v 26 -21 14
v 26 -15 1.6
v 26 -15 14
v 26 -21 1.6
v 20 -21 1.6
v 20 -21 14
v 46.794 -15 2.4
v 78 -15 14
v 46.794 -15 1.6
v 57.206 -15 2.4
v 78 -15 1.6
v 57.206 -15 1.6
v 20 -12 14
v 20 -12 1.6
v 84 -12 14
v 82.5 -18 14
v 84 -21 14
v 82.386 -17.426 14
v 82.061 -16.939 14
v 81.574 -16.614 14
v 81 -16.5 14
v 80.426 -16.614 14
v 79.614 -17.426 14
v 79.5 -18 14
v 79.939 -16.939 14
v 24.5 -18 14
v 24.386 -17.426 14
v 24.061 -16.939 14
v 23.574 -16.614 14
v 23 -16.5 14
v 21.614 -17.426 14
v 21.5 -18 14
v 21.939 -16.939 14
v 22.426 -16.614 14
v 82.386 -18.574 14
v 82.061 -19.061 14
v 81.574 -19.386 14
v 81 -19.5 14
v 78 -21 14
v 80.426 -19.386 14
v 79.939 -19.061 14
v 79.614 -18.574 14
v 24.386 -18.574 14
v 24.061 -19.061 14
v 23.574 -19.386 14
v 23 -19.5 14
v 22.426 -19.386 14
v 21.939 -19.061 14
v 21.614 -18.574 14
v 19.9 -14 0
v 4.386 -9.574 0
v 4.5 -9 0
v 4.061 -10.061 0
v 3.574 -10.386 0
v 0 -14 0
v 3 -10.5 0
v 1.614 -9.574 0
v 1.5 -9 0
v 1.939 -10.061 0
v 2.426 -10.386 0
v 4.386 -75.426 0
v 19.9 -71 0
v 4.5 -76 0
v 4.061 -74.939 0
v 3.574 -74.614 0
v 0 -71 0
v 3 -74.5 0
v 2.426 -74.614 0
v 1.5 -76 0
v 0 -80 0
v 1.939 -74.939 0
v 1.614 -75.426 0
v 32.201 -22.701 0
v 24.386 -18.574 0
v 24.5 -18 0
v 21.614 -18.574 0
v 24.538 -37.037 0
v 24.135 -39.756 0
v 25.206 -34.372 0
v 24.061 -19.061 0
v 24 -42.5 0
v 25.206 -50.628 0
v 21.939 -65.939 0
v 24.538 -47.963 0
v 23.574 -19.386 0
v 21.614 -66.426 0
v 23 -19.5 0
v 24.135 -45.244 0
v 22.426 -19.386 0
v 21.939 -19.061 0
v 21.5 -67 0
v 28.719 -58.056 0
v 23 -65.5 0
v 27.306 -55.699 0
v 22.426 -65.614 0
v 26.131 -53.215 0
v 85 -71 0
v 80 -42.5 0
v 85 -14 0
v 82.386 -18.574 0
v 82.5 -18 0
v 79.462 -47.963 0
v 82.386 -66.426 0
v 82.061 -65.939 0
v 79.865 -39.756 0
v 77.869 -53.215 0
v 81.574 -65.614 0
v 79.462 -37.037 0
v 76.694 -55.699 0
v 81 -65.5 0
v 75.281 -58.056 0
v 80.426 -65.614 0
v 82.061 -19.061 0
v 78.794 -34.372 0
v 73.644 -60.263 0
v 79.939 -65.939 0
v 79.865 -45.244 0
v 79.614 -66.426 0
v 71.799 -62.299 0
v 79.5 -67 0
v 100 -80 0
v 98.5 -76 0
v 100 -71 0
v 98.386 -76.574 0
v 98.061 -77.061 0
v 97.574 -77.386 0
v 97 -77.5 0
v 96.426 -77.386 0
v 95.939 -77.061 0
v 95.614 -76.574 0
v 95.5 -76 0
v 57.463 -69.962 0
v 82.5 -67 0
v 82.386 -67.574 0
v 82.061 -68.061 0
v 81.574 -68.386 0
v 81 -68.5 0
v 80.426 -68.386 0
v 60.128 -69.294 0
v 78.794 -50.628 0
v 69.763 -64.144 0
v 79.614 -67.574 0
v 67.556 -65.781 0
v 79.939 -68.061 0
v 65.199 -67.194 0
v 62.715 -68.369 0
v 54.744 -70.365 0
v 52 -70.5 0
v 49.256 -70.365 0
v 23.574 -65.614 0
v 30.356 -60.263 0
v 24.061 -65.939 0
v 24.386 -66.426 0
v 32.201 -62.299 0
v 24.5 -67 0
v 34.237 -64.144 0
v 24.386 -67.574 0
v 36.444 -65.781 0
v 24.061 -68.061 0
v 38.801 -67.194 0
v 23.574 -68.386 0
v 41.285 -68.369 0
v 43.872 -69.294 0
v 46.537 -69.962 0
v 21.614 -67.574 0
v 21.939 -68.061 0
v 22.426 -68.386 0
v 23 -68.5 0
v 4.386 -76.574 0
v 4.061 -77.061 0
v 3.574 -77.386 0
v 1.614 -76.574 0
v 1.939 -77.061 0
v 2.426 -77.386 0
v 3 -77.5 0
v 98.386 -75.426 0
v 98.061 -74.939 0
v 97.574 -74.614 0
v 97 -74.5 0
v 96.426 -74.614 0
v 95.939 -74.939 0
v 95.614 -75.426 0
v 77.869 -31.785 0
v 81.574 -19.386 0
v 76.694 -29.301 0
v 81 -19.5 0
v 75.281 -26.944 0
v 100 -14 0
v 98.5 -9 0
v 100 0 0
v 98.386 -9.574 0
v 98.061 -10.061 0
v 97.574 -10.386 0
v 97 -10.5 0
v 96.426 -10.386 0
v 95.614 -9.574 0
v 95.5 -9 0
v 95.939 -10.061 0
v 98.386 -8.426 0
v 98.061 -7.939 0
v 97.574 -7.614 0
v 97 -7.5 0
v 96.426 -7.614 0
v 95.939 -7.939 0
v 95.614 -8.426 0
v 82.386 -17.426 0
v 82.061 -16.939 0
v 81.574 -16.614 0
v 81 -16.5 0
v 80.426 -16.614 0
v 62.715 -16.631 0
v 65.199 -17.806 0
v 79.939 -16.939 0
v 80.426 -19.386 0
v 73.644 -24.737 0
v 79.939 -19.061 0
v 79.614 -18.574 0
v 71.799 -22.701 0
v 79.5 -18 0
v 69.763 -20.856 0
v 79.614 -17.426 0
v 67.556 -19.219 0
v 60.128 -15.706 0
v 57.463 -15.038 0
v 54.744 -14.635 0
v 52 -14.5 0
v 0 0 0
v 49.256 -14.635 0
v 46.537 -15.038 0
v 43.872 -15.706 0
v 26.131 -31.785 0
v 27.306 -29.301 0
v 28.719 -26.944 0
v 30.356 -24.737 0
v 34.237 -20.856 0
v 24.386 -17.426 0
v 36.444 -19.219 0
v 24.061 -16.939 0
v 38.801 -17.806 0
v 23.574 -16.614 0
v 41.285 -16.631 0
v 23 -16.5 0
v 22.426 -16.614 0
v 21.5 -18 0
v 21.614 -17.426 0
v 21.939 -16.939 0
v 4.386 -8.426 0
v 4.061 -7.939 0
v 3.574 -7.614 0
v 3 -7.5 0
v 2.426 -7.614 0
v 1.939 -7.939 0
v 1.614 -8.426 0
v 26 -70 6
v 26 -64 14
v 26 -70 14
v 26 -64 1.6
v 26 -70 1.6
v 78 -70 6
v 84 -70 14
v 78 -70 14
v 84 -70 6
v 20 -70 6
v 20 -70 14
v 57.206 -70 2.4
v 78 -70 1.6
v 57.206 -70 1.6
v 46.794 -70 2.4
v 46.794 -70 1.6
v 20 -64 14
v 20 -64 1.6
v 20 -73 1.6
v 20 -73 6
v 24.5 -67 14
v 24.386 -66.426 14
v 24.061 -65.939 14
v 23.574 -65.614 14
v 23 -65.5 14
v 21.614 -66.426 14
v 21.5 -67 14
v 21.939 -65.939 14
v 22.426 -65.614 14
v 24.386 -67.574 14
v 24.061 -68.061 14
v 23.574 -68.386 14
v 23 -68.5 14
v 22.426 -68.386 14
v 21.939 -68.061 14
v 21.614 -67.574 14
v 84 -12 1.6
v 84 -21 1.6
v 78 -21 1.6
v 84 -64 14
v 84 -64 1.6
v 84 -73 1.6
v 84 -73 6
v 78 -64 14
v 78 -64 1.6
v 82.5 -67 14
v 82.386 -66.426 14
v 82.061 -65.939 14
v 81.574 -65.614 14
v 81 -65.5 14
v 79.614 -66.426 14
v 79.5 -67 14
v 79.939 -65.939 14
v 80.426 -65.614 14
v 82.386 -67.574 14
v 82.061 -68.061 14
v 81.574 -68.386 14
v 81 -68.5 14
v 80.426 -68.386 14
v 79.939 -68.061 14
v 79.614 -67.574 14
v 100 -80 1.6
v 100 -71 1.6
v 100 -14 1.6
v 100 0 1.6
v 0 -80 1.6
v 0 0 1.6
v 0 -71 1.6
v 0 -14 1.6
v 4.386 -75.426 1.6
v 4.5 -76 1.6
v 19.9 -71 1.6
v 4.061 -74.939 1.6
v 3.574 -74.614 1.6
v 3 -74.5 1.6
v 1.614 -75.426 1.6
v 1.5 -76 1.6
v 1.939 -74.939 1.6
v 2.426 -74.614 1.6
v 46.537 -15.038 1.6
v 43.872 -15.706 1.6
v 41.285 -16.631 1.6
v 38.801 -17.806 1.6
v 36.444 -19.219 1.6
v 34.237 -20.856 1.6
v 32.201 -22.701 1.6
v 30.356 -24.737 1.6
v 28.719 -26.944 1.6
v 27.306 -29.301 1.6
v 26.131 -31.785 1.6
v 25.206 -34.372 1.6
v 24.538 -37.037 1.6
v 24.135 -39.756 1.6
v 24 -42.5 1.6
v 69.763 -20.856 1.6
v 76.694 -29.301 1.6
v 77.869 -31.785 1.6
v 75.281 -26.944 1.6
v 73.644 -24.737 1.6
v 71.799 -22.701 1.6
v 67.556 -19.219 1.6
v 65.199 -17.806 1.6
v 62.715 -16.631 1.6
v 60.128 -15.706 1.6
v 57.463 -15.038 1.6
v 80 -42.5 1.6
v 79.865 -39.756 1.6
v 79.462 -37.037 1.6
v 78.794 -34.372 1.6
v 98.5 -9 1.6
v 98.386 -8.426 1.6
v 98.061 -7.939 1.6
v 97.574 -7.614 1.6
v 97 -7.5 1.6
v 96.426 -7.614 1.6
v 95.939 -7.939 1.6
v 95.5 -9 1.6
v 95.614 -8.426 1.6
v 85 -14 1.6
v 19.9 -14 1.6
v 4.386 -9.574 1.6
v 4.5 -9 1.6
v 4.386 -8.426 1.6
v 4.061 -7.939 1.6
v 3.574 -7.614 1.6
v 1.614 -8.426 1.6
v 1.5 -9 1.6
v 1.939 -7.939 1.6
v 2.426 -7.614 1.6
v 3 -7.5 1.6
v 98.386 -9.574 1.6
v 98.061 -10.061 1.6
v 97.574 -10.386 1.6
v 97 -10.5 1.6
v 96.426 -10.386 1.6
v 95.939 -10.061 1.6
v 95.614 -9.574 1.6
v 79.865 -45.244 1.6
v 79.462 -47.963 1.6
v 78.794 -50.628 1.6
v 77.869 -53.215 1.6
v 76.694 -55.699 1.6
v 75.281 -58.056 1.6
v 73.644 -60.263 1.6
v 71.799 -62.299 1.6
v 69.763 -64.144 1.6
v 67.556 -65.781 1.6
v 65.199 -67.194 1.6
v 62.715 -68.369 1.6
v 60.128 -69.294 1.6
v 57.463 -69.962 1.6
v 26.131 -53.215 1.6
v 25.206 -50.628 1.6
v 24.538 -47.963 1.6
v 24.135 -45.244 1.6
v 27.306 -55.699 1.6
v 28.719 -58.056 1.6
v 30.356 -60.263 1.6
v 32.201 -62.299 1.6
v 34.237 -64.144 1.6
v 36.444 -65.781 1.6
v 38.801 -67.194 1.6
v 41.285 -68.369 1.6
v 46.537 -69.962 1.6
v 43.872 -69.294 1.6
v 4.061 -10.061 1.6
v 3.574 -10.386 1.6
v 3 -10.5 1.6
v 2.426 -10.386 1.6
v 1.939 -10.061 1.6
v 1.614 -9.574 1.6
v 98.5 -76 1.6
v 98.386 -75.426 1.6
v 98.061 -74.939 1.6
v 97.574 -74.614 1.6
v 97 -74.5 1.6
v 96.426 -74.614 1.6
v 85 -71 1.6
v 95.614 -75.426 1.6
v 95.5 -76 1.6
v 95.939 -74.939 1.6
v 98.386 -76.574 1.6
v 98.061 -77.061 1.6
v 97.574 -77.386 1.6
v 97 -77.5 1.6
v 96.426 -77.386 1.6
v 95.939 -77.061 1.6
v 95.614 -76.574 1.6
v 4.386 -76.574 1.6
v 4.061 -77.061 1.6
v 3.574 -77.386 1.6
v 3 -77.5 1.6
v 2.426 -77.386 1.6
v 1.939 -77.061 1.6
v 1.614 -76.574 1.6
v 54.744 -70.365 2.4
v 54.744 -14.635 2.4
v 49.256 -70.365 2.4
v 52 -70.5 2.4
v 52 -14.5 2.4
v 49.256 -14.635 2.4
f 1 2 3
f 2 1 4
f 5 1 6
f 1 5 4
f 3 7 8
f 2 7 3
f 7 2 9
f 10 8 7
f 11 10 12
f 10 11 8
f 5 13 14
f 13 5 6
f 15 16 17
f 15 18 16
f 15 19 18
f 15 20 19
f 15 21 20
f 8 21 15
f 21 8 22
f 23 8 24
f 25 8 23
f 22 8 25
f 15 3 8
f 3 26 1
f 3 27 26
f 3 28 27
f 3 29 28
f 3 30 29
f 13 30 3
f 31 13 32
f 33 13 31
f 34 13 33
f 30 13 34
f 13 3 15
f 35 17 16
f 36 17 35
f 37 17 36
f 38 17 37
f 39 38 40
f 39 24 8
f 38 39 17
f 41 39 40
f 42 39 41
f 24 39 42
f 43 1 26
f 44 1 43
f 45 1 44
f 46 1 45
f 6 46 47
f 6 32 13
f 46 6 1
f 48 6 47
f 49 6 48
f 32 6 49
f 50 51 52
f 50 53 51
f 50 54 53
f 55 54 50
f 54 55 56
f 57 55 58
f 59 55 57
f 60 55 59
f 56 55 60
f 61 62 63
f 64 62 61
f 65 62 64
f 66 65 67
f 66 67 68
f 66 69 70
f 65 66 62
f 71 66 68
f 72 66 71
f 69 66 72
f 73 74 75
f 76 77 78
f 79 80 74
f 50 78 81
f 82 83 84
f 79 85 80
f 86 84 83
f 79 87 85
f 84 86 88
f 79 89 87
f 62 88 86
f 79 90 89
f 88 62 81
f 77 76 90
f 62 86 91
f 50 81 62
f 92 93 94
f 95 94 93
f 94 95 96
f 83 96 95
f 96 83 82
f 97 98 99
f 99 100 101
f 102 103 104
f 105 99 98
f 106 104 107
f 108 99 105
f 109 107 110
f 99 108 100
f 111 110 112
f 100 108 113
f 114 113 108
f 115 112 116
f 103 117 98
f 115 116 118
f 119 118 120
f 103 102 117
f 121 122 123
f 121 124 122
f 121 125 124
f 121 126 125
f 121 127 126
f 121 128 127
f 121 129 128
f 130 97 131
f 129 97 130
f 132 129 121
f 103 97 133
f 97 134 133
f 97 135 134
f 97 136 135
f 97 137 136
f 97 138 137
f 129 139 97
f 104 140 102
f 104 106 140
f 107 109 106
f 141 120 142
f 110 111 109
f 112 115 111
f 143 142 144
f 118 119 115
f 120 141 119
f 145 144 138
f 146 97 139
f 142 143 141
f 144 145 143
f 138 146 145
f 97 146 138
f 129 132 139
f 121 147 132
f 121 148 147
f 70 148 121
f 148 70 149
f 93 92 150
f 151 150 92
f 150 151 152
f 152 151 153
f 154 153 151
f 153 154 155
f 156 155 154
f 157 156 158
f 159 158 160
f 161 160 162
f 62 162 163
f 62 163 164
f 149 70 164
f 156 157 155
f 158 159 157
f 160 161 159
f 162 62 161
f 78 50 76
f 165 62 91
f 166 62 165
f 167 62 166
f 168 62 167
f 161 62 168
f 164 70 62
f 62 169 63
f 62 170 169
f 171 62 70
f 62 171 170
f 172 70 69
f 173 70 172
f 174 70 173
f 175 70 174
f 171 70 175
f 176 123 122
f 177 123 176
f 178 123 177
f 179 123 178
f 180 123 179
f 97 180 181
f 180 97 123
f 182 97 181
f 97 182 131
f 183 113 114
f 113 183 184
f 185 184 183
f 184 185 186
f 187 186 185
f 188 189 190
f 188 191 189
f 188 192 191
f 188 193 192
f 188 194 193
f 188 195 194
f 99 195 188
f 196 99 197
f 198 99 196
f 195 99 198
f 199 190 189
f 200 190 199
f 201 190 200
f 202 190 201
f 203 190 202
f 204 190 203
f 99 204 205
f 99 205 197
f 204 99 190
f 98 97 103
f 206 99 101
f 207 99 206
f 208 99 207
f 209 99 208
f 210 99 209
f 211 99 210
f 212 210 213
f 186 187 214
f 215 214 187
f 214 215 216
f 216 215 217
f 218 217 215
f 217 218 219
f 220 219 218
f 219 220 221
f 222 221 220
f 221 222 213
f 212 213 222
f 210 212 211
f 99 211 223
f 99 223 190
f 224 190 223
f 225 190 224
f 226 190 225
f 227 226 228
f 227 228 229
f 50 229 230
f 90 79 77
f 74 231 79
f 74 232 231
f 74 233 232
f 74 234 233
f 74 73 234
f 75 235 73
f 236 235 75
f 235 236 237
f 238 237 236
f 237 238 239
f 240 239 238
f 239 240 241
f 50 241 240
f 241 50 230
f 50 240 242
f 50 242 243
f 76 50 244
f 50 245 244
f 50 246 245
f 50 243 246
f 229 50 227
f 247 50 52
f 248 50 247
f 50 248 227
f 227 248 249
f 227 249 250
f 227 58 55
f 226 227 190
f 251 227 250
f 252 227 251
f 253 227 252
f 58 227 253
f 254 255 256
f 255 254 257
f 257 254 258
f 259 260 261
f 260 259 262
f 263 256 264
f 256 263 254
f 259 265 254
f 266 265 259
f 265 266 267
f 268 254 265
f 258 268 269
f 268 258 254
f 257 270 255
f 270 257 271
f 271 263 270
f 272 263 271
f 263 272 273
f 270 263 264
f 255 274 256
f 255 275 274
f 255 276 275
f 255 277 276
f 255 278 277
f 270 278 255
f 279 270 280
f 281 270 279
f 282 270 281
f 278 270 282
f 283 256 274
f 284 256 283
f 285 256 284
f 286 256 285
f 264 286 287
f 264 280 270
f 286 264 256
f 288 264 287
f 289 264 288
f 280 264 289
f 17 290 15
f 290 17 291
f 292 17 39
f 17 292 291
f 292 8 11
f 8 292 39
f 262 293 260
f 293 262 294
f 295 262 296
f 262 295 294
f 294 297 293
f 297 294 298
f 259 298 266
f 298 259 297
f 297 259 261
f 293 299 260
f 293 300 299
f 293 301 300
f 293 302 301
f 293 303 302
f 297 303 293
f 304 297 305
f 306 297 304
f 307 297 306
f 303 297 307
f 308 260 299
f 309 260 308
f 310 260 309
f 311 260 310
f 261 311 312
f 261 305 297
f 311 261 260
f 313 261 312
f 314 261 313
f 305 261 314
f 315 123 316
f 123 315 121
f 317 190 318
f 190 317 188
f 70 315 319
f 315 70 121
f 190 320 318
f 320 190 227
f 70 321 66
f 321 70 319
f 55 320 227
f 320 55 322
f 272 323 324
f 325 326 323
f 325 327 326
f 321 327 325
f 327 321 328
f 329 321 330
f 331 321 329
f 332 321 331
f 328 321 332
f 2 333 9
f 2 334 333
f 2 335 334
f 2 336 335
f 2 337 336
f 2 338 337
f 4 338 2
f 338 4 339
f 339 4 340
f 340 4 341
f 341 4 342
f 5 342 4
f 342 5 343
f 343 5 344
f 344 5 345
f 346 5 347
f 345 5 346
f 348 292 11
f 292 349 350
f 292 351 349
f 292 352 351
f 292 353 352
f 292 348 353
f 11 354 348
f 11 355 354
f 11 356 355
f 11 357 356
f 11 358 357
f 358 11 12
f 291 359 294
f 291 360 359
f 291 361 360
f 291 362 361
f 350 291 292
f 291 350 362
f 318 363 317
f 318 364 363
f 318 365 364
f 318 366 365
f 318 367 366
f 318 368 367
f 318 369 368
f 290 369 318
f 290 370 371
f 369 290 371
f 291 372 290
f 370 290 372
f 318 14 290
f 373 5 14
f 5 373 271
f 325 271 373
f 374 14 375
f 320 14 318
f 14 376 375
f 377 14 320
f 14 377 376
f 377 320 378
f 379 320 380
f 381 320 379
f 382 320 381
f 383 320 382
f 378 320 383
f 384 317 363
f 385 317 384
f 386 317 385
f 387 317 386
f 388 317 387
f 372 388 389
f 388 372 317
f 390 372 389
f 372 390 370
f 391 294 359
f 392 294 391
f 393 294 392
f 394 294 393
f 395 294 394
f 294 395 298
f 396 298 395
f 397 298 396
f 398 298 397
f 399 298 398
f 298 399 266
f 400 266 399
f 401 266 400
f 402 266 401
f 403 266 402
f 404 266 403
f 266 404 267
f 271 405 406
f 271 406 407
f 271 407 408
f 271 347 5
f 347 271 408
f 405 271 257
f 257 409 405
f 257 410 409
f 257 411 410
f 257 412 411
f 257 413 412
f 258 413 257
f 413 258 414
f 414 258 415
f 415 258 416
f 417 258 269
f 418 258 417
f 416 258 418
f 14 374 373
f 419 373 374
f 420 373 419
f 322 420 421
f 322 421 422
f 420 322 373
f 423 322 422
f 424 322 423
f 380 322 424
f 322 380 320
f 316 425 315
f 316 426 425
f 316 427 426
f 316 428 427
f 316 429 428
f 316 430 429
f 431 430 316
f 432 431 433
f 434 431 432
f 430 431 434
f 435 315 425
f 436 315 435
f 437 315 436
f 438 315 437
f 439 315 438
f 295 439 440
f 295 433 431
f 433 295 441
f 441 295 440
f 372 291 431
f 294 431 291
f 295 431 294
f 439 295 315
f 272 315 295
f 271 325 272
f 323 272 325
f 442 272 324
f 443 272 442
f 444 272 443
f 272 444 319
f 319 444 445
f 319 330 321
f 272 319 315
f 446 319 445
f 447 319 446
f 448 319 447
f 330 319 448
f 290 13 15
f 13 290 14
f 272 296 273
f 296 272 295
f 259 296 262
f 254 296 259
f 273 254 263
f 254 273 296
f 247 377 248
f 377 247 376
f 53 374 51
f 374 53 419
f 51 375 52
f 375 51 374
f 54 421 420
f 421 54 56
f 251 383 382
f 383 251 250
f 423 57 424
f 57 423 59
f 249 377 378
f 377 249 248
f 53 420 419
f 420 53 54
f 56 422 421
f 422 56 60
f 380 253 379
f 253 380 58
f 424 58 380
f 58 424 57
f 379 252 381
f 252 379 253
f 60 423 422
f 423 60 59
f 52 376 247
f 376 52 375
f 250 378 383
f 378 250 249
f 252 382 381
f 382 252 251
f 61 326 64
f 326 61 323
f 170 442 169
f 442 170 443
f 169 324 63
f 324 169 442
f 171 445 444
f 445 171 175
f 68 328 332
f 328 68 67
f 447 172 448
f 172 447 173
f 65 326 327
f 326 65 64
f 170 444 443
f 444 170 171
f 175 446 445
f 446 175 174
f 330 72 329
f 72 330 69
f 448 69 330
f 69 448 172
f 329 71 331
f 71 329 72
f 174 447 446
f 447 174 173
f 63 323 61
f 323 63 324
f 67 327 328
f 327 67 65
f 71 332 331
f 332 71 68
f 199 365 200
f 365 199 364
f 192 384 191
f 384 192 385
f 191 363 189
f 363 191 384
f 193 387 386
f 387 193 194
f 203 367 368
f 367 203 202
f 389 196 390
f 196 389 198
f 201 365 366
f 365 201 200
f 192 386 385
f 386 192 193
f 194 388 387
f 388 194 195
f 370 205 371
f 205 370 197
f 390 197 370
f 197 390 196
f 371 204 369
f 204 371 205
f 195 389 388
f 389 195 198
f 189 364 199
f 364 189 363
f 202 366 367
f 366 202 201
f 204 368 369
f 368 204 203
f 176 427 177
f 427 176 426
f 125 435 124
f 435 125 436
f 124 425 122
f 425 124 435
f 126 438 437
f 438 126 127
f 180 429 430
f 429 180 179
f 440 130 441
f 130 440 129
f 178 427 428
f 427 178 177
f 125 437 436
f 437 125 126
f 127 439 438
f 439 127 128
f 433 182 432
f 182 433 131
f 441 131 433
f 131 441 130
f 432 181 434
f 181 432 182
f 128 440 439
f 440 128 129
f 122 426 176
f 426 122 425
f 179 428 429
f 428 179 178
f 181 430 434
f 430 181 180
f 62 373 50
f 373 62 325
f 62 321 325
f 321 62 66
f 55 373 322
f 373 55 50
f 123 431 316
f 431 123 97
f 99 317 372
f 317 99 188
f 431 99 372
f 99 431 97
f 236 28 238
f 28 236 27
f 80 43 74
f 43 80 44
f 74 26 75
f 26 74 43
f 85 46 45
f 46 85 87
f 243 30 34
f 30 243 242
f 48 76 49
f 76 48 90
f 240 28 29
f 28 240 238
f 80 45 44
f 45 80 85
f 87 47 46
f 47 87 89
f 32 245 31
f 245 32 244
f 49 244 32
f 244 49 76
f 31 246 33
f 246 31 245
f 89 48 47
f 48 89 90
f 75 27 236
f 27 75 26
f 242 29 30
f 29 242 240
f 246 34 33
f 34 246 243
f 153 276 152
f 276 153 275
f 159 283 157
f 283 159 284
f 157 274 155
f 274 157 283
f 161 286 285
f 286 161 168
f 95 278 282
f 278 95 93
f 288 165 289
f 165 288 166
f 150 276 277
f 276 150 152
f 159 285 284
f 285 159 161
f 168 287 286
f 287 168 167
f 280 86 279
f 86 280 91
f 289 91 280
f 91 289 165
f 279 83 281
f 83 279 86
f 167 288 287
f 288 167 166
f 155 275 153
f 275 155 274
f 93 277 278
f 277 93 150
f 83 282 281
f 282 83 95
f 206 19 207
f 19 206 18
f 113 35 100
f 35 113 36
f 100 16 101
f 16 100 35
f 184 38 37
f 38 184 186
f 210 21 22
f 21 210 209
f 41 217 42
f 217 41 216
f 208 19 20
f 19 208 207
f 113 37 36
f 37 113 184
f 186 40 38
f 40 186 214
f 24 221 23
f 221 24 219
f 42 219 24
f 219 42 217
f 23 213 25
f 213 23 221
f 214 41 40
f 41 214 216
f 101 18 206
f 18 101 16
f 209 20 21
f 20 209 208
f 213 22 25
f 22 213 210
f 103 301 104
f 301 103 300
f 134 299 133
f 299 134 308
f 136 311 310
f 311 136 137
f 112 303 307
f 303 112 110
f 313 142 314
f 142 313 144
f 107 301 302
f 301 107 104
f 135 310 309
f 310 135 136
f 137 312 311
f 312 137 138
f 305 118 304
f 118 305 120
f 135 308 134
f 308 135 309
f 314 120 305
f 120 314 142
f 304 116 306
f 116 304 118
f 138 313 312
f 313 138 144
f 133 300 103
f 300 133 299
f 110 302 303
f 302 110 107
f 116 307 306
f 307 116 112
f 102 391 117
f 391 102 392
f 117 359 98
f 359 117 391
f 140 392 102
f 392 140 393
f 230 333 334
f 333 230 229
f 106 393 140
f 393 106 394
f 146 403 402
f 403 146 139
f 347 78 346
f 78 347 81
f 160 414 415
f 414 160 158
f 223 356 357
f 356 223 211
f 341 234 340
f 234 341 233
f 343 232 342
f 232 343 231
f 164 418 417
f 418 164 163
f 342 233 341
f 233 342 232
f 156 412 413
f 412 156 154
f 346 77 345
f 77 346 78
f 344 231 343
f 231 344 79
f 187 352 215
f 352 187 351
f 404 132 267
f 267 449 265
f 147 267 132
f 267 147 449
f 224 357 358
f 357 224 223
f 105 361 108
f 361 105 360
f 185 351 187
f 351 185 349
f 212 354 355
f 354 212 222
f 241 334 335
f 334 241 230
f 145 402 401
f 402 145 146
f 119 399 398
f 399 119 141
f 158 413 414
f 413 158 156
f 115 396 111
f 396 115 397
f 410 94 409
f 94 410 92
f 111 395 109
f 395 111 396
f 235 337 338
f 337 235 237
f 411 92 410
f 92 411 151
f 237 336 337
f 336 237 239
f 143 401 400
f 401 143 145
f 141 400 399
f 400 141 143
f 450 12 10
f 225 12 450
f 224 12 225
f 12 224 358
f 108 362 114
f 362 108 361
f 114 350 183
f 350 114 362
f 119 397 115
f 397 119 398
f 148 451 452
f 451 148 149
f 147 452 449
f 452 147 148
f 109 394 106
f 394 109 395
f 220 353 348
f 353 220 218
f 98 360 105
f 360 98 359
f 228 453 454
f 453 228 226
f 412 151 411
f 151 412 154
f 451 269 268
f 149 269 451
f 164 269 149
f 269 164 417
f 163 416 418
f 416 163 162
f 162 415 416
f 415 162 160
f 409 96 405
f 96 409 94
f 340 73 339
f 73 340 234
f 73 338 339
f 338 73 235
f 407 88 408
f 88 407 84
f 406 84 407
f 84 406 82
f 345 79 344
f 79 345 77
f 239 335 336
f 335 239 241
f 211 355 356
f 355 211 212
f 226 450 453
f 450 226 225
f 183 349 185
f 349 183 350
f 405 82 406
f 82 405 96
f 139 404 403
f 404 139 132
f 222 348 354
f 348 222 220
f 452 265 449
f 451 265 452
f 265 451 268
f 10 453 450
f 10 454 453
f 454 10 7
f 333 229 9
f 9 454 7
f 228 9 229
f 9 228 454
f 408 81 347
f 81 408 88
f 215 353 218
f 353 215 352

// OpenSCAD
// file: ../library/din41612/connector_dim.scad
// connector
// Connector to be mounted on pcb of the modules

pcb_thick=1.6;

con_w=87.5;   // width of connector bodywithout flanges of mounting holes 
con_d=2.8;    // diameter of mounting holes
con_d_w=88.9; // distance between mounting holes
con_m_h=6;    // height of mounting cube
con_h=13;     // largest z dimension

pcb_d_h=10.2;  // ???

// connector dimensions
motherboard_con_head_w=85;  // width of the connector head
motherboard_con_head_d=8.5; // depth of the connector head
motherboard_con_w=95;       // largest width of the connector
motherboard_con_h=11.6;     // largest height of the connector
motherboard_con_t=11;       // largest depth of the connector
motherboard_con_d_w=90;     // distance between mounting holes
motherboard_con_d=2.8;      // diameter of mounting holes
motherboard_con_out=5.2;    // height produced by the connector when pulgged in 

// pcb module connector dimension
pcbmodule_con_out=13-(5.3+2.8-2.54);  // distance connector sticks out of pcb

// for codings
//code=2157;
//code_n=14;
//code_l=motherboard_con_head_w/code_n/2;
//
//label_width=24;
//label_thick=0.5;
//label_size=6;
//label_text_thick=1;
//label_height=label_size+2;
//pass=0.5;
// file: bracket.scad
// bracket
// A bracket of the elecbox module
// - type: 0 front bracket, 1 rear bracket
// - width 1..n in steps
// - var: 0 do not create intermediate mounting holes, 1 create intermediate mounting holes 

include <pcbmodule_dim.scad>
include <../motherboard/motherboard_dim.scad>
include <../library/linurs/linurs_screw_dim.scad>

use <../library/linurs/linurs_screw.scad>


module bracket(type=0, width=1, var=0){
  echo("bracket");  
  color("White")
  translate([type*motherboard_w,
             0,
             0])  // move mirrored bracket in position if desired
  mirror([type*1,0,0])       // mirror it if desired
  difference(){
    union(){
      for(x=[1:width]){  // create the mounting hole cubes 
        for(z=[pcb_y1,pcb_y2]){
          translate([pcb_x1,
                     (x-1)*step*var-bracket_hole_cube_h/2,
                     z])
          cube([bracket_x1-bracket_t,bracket_hole_cube_h,3*screw_d[bracket_screw]],center=true);
        }
      }

      translate([bracket_t/2+bracket_offset_x,
                 step/2*width-bracket_hole_cube_h,
                 bracket_h/2+bracket_offset_z])  
      cube([bracket_t,step*width,bracket_h],center=true);  // create the bracket front


      translate([bracket_x1/2+bracket_offset_x,
                 bracket_t/2-bracket_hole_cube_h,
                 bracket_h/2+bracket_offset_z]) 
      cube([bracket_x1,bracket_t,bracket_h],center=true);  // create the bracket mounting


      translate([bracket_x2/2+bracket_offset_x,
                 bracket_t/2-bracket_hole_cube_h+step*width-bracket_t,
                 bracket_h/2+bracket_offset_z]) 
      cube([bracket_x2,bracket_t,bracket_h],center=true);  // create the bracket mounting


    }
    for(x=[1:width]){ // create the mounting hole 
      for(z=[pcb_y1,pcb_y2]){
        translate([pcb_x1,
                   (x-1)*step*var-olp,
                   z])
        rotate([0,90,0])
        rotate([-90,0,0])
        screw_fix(w=2*bracket_hole_cube_h,d=bracket_screw,type=head_no, t=screw_t);
      }
    }
  }
}

// to show
//bracket(type=1, width=2, var=1);
//
bracket();
//
bracket(type=1);
// file: ../library/linurs/linurs_screw.scad
// Metric screws and nuts 
// urs@linurs.org 2019
// It is targeted for 3D printing applications. 
// To look realistic is not the goal (Example: Nuts do not have a hole)

include <linurs_screw_dim.scad>

// Changes
//2019-02-09 split in two files
//2017-05-19 bug fix hexbolt had wrong diameter
//2017-01-22 bug fix lentgh of hex scre is outer lenght as other screw types
//2017-01-06 added hex screw
//2015-10-12 added screw_cut
//2015-11-29 screw_fix parameter sunk added, and module hex_bolt

// Consistent parameters in this file
// d screw diameter M2_5, M3, ... (enumeration with screw_d)
// t millimeters added to diameters 
//   For the screw, head, nut = 0. 
//   For the piece where the screw, nut, ... passes through = 0.5 so it slides in well

// functions used multiple times to position nuts and heads
function headh_cyl(d)=screw_cyl[d][1];  // height of cyl screw head
function headh_cnt(d)=screw_cyl[d][1];  // height of cnt screw head
function headh(d,type=head_cyl)=(type==head_cyl ? headh_cyl(d) : (type==head_cnt ? headh_cnt(d) : 0 )); // height of screw head 

function nuth(d)=screw_hex[d][2];   // height of hex nut

// head of a cylinder screw
module screw_head_cyl(d=M3, t=0)
{
  screwhd=screw_cyl[d][0]+t; // diameter of cylinder screw head
  cylinder(d=screwhd,h=headh(d=d, type=head_cyl), center=true,$fn=16); // screw head
}

// head of a countersunk screw
module screw_head_cnt(d=M3, t=0)
{
  screwd=screw_d[d]+t; 
  screwhd=screw_cnt[d][0]+t; // diameter of cylinder screw head
  cylinder(d1=screwd,d2=screwhd,h=headh(d=d,type=head_cnt), center=true,$fn=16); // screw head
}

// head of a hex screw
module screw_head_hex(d=M3, t=0)
{
    translate([0,0,-nuth(d)/2])nut(d=d, t=t);
}

// head of all screws
module screw_head(d=M3, type=head_cyl, t=0)
{ 
  if(type==head_cnt){
    screw_head_cnt(d=d, t=t);
  } else {
    if(type==head_cyl){
      screw_head_cyl(d=d, t=t);
    } else {
       if(type==head_hex){
           screw_head_hex(d=d, t=t); 
       } 
    }    
  }
}

// hex bolt 
module hex_bolt(d=M3, h=10, t=0)
{
  nutd=screw_hex[d][1]+t; // outer diameter of hex bolt
  cylinder(r=nutd/2,h=h+t, center=true,$fn=6); // nut
}

// nut 
module nut(d=M3, t=0)
{
  hex_bolt(d=d, h=nuth(d), t=t);    
}

// screw 
// w outer width of the screw = screw length + head 
module screw(w=10, d=M3, type=head_cyl, t=0){
  screwd=screw_d[d]+t;       // screw diameter
  cylinder(d=screwd, h=w, center=true,$fn=16); // screw thread length
  translate([0,0,w/2-headh(d=d,type=type)/2])
  screw_head(d=d,type=type, t=t);
}

// screw fix
// w outer width of the screw = screw length + head 
// sink additional material below to remove 
// raise additional material above to remove
module screw_fix(w=10, d=M3, type=head_cyl, sink=0, raise=0, t=0){
  screw(w=w-sink*2, d=d, type=type, t=t);
  translate([0,0,-(w-sink*2)/2+nuth(d)/2])
    nut(d=d,t=t);
  //additional material to be removed above the nut  
  translate([0,0,-(w-sink+raise)/2])hex_bolt(d=d,h=sink+raise+0.01,t=t);    
  //additional material to be removed above the screw head
  if(type==head_cnt){  
    translate([0,0,(w-sink+raise)/2])
    cylinder(d=screw_cnt[d][0]+t,h=sink+raise+0.01,center=true,$fn=16);
  }else{ 
    translate([0,0,(w-sink+raise)/2])
    cylinder(d=screw_cyl[d][0]+t,h=sink+raise+0.01,center=true,$fn=16);
  }     
}
//screw_fix();
//translate([10,0,0])screw_fix(sink=2,type=head_cnt);
//

// screw cut
// material to be extracted from object to slide in a counter sunk screw for fixation
// w height of the cut out
// i depth of the screw
module screw_cut(d=M3,w=20,i=10,t=0,fn=32){
    hsh=screw_cnt[d][1];
    ws=screw_cnt[d][0]+t;
    ds=screw_d[d]+t;
    
    translate([i/2,0,-(w-hsh)/2])
      cube([i,ws,hsh],center=true);
    
    translate([0,0,-(w-hsh)/2])
      cylinder(d=ws,h=hsh,center=true,$fn=32);
    
    translate([0,0,-(w-hsh)/2+hsh])
        cylinder(d2=ds, d1=ws, h=hsh,center=true,$fn=fn);
    
    cylinder(h=w, d=ds, center=true, $fn=fn);   
    
    translate([i/2,0,0]) 
        cube([i,ds,w],center=true);
    
    for(y=[-1,1]){
        translate([i/2,y*ds/2,-w/2+hsh])
            rotate([45,0,0])
            cube([i,sqrt(2)*(ws-ds)/2,sqrt(2)*(ws-ds)/2],center=true);
    }
}
//screw_cut();

// nut cut
// material to be extracted from object to slide in a nut for fixation
// w height of the cylinder
// i lenght of the inlet
module nut_cut(w=10, wi=0, d=M3, i=10, t=0, raise=0, type=head_cyl){ 
  nut(d,t);
  translate([i/2,0,0])
    cube([i,screw_hex[d][0]+t,nuth(d)+t],center=true);
  translate([0,0,-wi])
      if(type==head_cnt){    
          screw(w=w, d=d, type=type, t=t); 
        translate([0,0,(w+raise)/2-0.01])
          cylinder(d=screw_cnt[d][0]+t,h=raise,center=true,$fn=16);
      }else{ 
          screw(w=w, d=d, type=type, t=t);   
        translate([0,0,(w+raise)/2-0.01])
          cylinder(d=screw_cyl[d][0]+t,h=raise,center=true,$fn=16);
      }       
}
//nut_cut(raise=2,type=head_cnt,i=14,w=20,wi=2, t=1);

// present the library
show=1;

if(show==1){
    grid=20;
    
    for (j=[0:10]){
        for (i=[0:3])
           translate([j*grid,i*grid,0]){  
           
    // elements           
           if(j==0){
             screw_fix(w=(i+2)*5,d=i, type=head_cyl, t=0);
           }
       
           if(j==1){
             nut(d=i,t=0);
           } 
       
           if(j==2){   
              screw(d=i,t=0);
           } 
           
           if(j==3){   
              screw(d=i,t=0,type=head_cnt);
           } 
           
           if(j==4){   
              screw(d=i,t=0,type=head_hex);
           } 
           
           if(j==5){   
              hex_bolt(d=i,t=0);
           } 
           
       }
    }   
     
    for (j=[0:2]){
        for (i=[0:3])
           translate([j*grid,-(i+1)*grid,0]){  
             difference(){
                cube([3*screw_d[i],3*screw_d[i],(i+2)*5-0.1],center=true);    
    
                if(j==0){
                  screw_fix(w=(i+2)*5,d=i,type=head_cnt, t=0.5);
                }   
                
                if(j==1){
                  nut_cut(d=i,w=(i+2)*5);
                }
                if(j==2){
                  screw_cut(d=1,w=(i+2)*5);
                }
            
             }
           }  
        
    }
}
   
// file: ../library/linurs/linurs_screw_dim.scad
// Metric screws and nuts 
// urs@linurs.org 2015

// contains dimensions of linurs_screw and can be included in other 
// OpenScad files 


// Consistent parameters in this file
// d screw diameter M2_5, M3, ... (enumeration with screw_d)
// t millimeters added to diameters 
//   For the screw, head, nut = 0. 
//   For the piece where the screw, nut, ... passes through = 0.5 so it slides in well

// enumerations of metric threads
M2_5=0;
M3=1;
M4=2;
M5=3;

// enumerations screw head type
head_cyl=0; // cylinder
head_cnt=1; // countrsunk
head_no=2;  // no head at all
head_hex=3;  // no head at all

// screw diameters
screw_d=[
2.5, // M2.5
3.0, // M3
4.0, // M4
5.0  // M5
];

// sizes for hex nuts
screw_hex=[
//   s,   e,   h
 [ 5.0, 5.8, 1.7], // M2.5
 [ 5.5, 6.4, 2.0], // M3
 [ 7.0, 8.1, 2.8], // M4
 [ 8.0, 9.2, 3.5]  // M5
];

// sizes for cylinder screw heads
screw_cyl=[
//   d,   h
 [ 4.5, 1.6], // M2.5
 [ 5.5, 2.0], // M3
 [ 7.0, 2.6], // M4
 [ 8.5, 3.3]  // M5
];

// sizes for countersunk screw heads
screw_cnt=[
//   d,   h
 [ 4.7, 1.50], // M2.5
 [ 5.6, 1.65], // M3
 [ 7.4, 2.20], // M4
 [ 9.2, 2.50]  // M5
];
// file: ../motherboard/motherboard_dim.scad
include<../library/din41612/connector_dim.scad>
// motherboard pcb dimensions
motherboard_w=100;   // pcb width
motherboard_t=1.6;   // pcb thickness
motherboard_pass=0.5;// gap to fit screws 
step=25.4;           // distance between modules



// offset
motherboard_z_offset= -(pcbmodule_con_out+motherboard_con_out+motherboard_t); // z offset motherboard built in
// file: pcbmodule_dim.scad
include <../library/linurs/linurs_screw_dim.scad>
include <../motherboard/motherboard_dim.scad>
// pcb constants
pcb_h=80;              // height of the pcb
pcb_thick=1.6;         // thickness
pcb_x1=3;              // position mounting holes
pcb_x2=97;
pcb_y1=9;
pcb_y2=76;
pcb_d=3;               // diameter of holes

// bracket constants
bracket_t=2;           // thickness of bracket
bracket_x1=10;         // depth of the U shape at the side of the screw
bracket_x2=4;          // depth of the U shape at the side where no screw is  
bracket_h=pcb_h+15;    // height of bracket
bracket_hole_cube_h=4; // height of the mounting hole cube
bracket_screw=M2_5;    // hole for the screw

// bracket offsets
bracket_offset_x=-3;   // bracket offset in elecbox x axis (adding gap)
bracket_offset_z=-10;  // bracket offset in elecbox z axis

// pcb module dimensions
pcbmodule_w=(-bracket_offset_x)*2+motherboard_w; // depth of the module
pcbmodule_h=bracket_h;                           // hight of the module   
pcbmodule_l=step;                                // width of the module   

screw_t=1; //mm added so screws fit into holes
olp=0.1; // overlapp distance to produce nice body after difference() 
// main file
// pcb
// pcb of the module
// This module is not intended to be 3D printed

include <pcbmodule_dim.scad>
include <../motherboard/motherboard_dim.scad>
include <../library/linurs/linurs_screw_dim.scad>

use <../library/linurs/linurs_screw.scad>
use <bracket.scad>

w1=57;
l1=20;
z1=49;
z2=56;
zm=(pcb_y1+pcb_y2)/2;
x1=23;
x2=58;
x3=85;
y1=14;

module pcb(){
  echo("pcb");  
  color("greenyellow")
  difference(){
    union(){  
        cube([motherboard_w,pcb_thick,pcb_h]); // pcb
        for(x=[0,1]){ // spacers
          for(z=[-1,1]){
            translate([x*x2+x1,y1/2,z*z1/2+zm])  
            cube([2*pcb_d,y1,2*pcb_d],center=true);
          }
        }  
        translate([x1-pcb_d,0,-z1/2-2*pcb_d+zm])  // spacer wall
        cube([x2+2*pcb_d,y1,pcb_d]);

        translate([x1-pcb_d,0,z1/2+pcb_d+zm])  // spacer wall
        cube([x2+2*pcb_d,6,pcb_d]);
    }
    
    for(x=[pcb_x1,pcb_x2]){ // mount mounting holes
      for(y=[pcb_y1,pcb_y2]){
        translate([x,0,y])
        rotate([90,0,0])
        cylinder(d=pcb_d,h=3*pcb_thick,center=true,$fn=16);
      }
    }
    
    // cut out for USB and Ethernet and opposite cut
    for(x=[-0.1,x3]){ // mounting holes
      translate([x,-pcb_thick/2,zm-w1/2])cube([l1,pcb_thick*2,w1]);
    }
    // raspi mounting holes
    for(x=[0,1]){ // mounting holes
      for(z=[-1,1]){
        translate([x*x2+x1,0,z*z1/2+zm])
        rotate([90,0,0])
        cylinder(d=pcb_d,h=3*y1,center=true,$fn=16);
      }
    }
    // hole to save material
    translate([x1+x2/2,0,zm]) 
    rotate([90,0,0])
    cylinder(d=z2,h=3*pcb_thick,center=true,$fn=64);
  }
}
//
rotate([90,0,0])
//
pcb();

module RaspberryPi3Bback(){
    h=8;
    w=8;
    z=40;
    zd=20;
    
    difference(){
        translate([0,0,0])bracket(type=1);
        
        for(i=[-1,0,1]){
            translate([motherboard_w,h/2+pcb_thick+step/2,z+w/2+i*zd])
              cube([bracket_x1,h,w],center=true);     
            translate([motherboard_w,h+pcb_thick+step/2-h,z+h/2+i*zd])
            rotate([0,90,0])
              cylinder(h=bracket_x1,d=h,center=true, $fn=16);
        }         
    }
}
//rotate([0,90,0])
//RaspberryPi3Bback();

module RaspberryPi3Bfront(){
    Eth_h=14.5;
    Eth_w=17.5;
    
    Usb_h=17;
    Usb_w=16;
    
    y3=3;
    h3=Usb_h;
    w3=Usb_w;
    z3=16;//17.5;
    
    y2=3;
    h2=Usb_h;
    w2=Usb_w;
    z2=z3+18;
    
    y1=1.6;
    h1=Eth_h;
    w1=Eth_w;
    z1=z2+18;
    
    difference(){
        bracket(type=0);
        translate([0,h1/2+pcb_thick-y1,z1+w1/2])cube([bracket_x1,h1,w1],center=true); 
        translate([0,h2/2+pcb_thick-y2,z2+w2/2])cube([bracket_x1,h2,w2],center=true); 
        translate([0,h3/2+pcb_thick-y3,z3+w3/2])cube([bracket_x1,h3,w3],center=true);         
    }
}
//rotate([0,-90,0])
//RaspberryPi3Bfront();
